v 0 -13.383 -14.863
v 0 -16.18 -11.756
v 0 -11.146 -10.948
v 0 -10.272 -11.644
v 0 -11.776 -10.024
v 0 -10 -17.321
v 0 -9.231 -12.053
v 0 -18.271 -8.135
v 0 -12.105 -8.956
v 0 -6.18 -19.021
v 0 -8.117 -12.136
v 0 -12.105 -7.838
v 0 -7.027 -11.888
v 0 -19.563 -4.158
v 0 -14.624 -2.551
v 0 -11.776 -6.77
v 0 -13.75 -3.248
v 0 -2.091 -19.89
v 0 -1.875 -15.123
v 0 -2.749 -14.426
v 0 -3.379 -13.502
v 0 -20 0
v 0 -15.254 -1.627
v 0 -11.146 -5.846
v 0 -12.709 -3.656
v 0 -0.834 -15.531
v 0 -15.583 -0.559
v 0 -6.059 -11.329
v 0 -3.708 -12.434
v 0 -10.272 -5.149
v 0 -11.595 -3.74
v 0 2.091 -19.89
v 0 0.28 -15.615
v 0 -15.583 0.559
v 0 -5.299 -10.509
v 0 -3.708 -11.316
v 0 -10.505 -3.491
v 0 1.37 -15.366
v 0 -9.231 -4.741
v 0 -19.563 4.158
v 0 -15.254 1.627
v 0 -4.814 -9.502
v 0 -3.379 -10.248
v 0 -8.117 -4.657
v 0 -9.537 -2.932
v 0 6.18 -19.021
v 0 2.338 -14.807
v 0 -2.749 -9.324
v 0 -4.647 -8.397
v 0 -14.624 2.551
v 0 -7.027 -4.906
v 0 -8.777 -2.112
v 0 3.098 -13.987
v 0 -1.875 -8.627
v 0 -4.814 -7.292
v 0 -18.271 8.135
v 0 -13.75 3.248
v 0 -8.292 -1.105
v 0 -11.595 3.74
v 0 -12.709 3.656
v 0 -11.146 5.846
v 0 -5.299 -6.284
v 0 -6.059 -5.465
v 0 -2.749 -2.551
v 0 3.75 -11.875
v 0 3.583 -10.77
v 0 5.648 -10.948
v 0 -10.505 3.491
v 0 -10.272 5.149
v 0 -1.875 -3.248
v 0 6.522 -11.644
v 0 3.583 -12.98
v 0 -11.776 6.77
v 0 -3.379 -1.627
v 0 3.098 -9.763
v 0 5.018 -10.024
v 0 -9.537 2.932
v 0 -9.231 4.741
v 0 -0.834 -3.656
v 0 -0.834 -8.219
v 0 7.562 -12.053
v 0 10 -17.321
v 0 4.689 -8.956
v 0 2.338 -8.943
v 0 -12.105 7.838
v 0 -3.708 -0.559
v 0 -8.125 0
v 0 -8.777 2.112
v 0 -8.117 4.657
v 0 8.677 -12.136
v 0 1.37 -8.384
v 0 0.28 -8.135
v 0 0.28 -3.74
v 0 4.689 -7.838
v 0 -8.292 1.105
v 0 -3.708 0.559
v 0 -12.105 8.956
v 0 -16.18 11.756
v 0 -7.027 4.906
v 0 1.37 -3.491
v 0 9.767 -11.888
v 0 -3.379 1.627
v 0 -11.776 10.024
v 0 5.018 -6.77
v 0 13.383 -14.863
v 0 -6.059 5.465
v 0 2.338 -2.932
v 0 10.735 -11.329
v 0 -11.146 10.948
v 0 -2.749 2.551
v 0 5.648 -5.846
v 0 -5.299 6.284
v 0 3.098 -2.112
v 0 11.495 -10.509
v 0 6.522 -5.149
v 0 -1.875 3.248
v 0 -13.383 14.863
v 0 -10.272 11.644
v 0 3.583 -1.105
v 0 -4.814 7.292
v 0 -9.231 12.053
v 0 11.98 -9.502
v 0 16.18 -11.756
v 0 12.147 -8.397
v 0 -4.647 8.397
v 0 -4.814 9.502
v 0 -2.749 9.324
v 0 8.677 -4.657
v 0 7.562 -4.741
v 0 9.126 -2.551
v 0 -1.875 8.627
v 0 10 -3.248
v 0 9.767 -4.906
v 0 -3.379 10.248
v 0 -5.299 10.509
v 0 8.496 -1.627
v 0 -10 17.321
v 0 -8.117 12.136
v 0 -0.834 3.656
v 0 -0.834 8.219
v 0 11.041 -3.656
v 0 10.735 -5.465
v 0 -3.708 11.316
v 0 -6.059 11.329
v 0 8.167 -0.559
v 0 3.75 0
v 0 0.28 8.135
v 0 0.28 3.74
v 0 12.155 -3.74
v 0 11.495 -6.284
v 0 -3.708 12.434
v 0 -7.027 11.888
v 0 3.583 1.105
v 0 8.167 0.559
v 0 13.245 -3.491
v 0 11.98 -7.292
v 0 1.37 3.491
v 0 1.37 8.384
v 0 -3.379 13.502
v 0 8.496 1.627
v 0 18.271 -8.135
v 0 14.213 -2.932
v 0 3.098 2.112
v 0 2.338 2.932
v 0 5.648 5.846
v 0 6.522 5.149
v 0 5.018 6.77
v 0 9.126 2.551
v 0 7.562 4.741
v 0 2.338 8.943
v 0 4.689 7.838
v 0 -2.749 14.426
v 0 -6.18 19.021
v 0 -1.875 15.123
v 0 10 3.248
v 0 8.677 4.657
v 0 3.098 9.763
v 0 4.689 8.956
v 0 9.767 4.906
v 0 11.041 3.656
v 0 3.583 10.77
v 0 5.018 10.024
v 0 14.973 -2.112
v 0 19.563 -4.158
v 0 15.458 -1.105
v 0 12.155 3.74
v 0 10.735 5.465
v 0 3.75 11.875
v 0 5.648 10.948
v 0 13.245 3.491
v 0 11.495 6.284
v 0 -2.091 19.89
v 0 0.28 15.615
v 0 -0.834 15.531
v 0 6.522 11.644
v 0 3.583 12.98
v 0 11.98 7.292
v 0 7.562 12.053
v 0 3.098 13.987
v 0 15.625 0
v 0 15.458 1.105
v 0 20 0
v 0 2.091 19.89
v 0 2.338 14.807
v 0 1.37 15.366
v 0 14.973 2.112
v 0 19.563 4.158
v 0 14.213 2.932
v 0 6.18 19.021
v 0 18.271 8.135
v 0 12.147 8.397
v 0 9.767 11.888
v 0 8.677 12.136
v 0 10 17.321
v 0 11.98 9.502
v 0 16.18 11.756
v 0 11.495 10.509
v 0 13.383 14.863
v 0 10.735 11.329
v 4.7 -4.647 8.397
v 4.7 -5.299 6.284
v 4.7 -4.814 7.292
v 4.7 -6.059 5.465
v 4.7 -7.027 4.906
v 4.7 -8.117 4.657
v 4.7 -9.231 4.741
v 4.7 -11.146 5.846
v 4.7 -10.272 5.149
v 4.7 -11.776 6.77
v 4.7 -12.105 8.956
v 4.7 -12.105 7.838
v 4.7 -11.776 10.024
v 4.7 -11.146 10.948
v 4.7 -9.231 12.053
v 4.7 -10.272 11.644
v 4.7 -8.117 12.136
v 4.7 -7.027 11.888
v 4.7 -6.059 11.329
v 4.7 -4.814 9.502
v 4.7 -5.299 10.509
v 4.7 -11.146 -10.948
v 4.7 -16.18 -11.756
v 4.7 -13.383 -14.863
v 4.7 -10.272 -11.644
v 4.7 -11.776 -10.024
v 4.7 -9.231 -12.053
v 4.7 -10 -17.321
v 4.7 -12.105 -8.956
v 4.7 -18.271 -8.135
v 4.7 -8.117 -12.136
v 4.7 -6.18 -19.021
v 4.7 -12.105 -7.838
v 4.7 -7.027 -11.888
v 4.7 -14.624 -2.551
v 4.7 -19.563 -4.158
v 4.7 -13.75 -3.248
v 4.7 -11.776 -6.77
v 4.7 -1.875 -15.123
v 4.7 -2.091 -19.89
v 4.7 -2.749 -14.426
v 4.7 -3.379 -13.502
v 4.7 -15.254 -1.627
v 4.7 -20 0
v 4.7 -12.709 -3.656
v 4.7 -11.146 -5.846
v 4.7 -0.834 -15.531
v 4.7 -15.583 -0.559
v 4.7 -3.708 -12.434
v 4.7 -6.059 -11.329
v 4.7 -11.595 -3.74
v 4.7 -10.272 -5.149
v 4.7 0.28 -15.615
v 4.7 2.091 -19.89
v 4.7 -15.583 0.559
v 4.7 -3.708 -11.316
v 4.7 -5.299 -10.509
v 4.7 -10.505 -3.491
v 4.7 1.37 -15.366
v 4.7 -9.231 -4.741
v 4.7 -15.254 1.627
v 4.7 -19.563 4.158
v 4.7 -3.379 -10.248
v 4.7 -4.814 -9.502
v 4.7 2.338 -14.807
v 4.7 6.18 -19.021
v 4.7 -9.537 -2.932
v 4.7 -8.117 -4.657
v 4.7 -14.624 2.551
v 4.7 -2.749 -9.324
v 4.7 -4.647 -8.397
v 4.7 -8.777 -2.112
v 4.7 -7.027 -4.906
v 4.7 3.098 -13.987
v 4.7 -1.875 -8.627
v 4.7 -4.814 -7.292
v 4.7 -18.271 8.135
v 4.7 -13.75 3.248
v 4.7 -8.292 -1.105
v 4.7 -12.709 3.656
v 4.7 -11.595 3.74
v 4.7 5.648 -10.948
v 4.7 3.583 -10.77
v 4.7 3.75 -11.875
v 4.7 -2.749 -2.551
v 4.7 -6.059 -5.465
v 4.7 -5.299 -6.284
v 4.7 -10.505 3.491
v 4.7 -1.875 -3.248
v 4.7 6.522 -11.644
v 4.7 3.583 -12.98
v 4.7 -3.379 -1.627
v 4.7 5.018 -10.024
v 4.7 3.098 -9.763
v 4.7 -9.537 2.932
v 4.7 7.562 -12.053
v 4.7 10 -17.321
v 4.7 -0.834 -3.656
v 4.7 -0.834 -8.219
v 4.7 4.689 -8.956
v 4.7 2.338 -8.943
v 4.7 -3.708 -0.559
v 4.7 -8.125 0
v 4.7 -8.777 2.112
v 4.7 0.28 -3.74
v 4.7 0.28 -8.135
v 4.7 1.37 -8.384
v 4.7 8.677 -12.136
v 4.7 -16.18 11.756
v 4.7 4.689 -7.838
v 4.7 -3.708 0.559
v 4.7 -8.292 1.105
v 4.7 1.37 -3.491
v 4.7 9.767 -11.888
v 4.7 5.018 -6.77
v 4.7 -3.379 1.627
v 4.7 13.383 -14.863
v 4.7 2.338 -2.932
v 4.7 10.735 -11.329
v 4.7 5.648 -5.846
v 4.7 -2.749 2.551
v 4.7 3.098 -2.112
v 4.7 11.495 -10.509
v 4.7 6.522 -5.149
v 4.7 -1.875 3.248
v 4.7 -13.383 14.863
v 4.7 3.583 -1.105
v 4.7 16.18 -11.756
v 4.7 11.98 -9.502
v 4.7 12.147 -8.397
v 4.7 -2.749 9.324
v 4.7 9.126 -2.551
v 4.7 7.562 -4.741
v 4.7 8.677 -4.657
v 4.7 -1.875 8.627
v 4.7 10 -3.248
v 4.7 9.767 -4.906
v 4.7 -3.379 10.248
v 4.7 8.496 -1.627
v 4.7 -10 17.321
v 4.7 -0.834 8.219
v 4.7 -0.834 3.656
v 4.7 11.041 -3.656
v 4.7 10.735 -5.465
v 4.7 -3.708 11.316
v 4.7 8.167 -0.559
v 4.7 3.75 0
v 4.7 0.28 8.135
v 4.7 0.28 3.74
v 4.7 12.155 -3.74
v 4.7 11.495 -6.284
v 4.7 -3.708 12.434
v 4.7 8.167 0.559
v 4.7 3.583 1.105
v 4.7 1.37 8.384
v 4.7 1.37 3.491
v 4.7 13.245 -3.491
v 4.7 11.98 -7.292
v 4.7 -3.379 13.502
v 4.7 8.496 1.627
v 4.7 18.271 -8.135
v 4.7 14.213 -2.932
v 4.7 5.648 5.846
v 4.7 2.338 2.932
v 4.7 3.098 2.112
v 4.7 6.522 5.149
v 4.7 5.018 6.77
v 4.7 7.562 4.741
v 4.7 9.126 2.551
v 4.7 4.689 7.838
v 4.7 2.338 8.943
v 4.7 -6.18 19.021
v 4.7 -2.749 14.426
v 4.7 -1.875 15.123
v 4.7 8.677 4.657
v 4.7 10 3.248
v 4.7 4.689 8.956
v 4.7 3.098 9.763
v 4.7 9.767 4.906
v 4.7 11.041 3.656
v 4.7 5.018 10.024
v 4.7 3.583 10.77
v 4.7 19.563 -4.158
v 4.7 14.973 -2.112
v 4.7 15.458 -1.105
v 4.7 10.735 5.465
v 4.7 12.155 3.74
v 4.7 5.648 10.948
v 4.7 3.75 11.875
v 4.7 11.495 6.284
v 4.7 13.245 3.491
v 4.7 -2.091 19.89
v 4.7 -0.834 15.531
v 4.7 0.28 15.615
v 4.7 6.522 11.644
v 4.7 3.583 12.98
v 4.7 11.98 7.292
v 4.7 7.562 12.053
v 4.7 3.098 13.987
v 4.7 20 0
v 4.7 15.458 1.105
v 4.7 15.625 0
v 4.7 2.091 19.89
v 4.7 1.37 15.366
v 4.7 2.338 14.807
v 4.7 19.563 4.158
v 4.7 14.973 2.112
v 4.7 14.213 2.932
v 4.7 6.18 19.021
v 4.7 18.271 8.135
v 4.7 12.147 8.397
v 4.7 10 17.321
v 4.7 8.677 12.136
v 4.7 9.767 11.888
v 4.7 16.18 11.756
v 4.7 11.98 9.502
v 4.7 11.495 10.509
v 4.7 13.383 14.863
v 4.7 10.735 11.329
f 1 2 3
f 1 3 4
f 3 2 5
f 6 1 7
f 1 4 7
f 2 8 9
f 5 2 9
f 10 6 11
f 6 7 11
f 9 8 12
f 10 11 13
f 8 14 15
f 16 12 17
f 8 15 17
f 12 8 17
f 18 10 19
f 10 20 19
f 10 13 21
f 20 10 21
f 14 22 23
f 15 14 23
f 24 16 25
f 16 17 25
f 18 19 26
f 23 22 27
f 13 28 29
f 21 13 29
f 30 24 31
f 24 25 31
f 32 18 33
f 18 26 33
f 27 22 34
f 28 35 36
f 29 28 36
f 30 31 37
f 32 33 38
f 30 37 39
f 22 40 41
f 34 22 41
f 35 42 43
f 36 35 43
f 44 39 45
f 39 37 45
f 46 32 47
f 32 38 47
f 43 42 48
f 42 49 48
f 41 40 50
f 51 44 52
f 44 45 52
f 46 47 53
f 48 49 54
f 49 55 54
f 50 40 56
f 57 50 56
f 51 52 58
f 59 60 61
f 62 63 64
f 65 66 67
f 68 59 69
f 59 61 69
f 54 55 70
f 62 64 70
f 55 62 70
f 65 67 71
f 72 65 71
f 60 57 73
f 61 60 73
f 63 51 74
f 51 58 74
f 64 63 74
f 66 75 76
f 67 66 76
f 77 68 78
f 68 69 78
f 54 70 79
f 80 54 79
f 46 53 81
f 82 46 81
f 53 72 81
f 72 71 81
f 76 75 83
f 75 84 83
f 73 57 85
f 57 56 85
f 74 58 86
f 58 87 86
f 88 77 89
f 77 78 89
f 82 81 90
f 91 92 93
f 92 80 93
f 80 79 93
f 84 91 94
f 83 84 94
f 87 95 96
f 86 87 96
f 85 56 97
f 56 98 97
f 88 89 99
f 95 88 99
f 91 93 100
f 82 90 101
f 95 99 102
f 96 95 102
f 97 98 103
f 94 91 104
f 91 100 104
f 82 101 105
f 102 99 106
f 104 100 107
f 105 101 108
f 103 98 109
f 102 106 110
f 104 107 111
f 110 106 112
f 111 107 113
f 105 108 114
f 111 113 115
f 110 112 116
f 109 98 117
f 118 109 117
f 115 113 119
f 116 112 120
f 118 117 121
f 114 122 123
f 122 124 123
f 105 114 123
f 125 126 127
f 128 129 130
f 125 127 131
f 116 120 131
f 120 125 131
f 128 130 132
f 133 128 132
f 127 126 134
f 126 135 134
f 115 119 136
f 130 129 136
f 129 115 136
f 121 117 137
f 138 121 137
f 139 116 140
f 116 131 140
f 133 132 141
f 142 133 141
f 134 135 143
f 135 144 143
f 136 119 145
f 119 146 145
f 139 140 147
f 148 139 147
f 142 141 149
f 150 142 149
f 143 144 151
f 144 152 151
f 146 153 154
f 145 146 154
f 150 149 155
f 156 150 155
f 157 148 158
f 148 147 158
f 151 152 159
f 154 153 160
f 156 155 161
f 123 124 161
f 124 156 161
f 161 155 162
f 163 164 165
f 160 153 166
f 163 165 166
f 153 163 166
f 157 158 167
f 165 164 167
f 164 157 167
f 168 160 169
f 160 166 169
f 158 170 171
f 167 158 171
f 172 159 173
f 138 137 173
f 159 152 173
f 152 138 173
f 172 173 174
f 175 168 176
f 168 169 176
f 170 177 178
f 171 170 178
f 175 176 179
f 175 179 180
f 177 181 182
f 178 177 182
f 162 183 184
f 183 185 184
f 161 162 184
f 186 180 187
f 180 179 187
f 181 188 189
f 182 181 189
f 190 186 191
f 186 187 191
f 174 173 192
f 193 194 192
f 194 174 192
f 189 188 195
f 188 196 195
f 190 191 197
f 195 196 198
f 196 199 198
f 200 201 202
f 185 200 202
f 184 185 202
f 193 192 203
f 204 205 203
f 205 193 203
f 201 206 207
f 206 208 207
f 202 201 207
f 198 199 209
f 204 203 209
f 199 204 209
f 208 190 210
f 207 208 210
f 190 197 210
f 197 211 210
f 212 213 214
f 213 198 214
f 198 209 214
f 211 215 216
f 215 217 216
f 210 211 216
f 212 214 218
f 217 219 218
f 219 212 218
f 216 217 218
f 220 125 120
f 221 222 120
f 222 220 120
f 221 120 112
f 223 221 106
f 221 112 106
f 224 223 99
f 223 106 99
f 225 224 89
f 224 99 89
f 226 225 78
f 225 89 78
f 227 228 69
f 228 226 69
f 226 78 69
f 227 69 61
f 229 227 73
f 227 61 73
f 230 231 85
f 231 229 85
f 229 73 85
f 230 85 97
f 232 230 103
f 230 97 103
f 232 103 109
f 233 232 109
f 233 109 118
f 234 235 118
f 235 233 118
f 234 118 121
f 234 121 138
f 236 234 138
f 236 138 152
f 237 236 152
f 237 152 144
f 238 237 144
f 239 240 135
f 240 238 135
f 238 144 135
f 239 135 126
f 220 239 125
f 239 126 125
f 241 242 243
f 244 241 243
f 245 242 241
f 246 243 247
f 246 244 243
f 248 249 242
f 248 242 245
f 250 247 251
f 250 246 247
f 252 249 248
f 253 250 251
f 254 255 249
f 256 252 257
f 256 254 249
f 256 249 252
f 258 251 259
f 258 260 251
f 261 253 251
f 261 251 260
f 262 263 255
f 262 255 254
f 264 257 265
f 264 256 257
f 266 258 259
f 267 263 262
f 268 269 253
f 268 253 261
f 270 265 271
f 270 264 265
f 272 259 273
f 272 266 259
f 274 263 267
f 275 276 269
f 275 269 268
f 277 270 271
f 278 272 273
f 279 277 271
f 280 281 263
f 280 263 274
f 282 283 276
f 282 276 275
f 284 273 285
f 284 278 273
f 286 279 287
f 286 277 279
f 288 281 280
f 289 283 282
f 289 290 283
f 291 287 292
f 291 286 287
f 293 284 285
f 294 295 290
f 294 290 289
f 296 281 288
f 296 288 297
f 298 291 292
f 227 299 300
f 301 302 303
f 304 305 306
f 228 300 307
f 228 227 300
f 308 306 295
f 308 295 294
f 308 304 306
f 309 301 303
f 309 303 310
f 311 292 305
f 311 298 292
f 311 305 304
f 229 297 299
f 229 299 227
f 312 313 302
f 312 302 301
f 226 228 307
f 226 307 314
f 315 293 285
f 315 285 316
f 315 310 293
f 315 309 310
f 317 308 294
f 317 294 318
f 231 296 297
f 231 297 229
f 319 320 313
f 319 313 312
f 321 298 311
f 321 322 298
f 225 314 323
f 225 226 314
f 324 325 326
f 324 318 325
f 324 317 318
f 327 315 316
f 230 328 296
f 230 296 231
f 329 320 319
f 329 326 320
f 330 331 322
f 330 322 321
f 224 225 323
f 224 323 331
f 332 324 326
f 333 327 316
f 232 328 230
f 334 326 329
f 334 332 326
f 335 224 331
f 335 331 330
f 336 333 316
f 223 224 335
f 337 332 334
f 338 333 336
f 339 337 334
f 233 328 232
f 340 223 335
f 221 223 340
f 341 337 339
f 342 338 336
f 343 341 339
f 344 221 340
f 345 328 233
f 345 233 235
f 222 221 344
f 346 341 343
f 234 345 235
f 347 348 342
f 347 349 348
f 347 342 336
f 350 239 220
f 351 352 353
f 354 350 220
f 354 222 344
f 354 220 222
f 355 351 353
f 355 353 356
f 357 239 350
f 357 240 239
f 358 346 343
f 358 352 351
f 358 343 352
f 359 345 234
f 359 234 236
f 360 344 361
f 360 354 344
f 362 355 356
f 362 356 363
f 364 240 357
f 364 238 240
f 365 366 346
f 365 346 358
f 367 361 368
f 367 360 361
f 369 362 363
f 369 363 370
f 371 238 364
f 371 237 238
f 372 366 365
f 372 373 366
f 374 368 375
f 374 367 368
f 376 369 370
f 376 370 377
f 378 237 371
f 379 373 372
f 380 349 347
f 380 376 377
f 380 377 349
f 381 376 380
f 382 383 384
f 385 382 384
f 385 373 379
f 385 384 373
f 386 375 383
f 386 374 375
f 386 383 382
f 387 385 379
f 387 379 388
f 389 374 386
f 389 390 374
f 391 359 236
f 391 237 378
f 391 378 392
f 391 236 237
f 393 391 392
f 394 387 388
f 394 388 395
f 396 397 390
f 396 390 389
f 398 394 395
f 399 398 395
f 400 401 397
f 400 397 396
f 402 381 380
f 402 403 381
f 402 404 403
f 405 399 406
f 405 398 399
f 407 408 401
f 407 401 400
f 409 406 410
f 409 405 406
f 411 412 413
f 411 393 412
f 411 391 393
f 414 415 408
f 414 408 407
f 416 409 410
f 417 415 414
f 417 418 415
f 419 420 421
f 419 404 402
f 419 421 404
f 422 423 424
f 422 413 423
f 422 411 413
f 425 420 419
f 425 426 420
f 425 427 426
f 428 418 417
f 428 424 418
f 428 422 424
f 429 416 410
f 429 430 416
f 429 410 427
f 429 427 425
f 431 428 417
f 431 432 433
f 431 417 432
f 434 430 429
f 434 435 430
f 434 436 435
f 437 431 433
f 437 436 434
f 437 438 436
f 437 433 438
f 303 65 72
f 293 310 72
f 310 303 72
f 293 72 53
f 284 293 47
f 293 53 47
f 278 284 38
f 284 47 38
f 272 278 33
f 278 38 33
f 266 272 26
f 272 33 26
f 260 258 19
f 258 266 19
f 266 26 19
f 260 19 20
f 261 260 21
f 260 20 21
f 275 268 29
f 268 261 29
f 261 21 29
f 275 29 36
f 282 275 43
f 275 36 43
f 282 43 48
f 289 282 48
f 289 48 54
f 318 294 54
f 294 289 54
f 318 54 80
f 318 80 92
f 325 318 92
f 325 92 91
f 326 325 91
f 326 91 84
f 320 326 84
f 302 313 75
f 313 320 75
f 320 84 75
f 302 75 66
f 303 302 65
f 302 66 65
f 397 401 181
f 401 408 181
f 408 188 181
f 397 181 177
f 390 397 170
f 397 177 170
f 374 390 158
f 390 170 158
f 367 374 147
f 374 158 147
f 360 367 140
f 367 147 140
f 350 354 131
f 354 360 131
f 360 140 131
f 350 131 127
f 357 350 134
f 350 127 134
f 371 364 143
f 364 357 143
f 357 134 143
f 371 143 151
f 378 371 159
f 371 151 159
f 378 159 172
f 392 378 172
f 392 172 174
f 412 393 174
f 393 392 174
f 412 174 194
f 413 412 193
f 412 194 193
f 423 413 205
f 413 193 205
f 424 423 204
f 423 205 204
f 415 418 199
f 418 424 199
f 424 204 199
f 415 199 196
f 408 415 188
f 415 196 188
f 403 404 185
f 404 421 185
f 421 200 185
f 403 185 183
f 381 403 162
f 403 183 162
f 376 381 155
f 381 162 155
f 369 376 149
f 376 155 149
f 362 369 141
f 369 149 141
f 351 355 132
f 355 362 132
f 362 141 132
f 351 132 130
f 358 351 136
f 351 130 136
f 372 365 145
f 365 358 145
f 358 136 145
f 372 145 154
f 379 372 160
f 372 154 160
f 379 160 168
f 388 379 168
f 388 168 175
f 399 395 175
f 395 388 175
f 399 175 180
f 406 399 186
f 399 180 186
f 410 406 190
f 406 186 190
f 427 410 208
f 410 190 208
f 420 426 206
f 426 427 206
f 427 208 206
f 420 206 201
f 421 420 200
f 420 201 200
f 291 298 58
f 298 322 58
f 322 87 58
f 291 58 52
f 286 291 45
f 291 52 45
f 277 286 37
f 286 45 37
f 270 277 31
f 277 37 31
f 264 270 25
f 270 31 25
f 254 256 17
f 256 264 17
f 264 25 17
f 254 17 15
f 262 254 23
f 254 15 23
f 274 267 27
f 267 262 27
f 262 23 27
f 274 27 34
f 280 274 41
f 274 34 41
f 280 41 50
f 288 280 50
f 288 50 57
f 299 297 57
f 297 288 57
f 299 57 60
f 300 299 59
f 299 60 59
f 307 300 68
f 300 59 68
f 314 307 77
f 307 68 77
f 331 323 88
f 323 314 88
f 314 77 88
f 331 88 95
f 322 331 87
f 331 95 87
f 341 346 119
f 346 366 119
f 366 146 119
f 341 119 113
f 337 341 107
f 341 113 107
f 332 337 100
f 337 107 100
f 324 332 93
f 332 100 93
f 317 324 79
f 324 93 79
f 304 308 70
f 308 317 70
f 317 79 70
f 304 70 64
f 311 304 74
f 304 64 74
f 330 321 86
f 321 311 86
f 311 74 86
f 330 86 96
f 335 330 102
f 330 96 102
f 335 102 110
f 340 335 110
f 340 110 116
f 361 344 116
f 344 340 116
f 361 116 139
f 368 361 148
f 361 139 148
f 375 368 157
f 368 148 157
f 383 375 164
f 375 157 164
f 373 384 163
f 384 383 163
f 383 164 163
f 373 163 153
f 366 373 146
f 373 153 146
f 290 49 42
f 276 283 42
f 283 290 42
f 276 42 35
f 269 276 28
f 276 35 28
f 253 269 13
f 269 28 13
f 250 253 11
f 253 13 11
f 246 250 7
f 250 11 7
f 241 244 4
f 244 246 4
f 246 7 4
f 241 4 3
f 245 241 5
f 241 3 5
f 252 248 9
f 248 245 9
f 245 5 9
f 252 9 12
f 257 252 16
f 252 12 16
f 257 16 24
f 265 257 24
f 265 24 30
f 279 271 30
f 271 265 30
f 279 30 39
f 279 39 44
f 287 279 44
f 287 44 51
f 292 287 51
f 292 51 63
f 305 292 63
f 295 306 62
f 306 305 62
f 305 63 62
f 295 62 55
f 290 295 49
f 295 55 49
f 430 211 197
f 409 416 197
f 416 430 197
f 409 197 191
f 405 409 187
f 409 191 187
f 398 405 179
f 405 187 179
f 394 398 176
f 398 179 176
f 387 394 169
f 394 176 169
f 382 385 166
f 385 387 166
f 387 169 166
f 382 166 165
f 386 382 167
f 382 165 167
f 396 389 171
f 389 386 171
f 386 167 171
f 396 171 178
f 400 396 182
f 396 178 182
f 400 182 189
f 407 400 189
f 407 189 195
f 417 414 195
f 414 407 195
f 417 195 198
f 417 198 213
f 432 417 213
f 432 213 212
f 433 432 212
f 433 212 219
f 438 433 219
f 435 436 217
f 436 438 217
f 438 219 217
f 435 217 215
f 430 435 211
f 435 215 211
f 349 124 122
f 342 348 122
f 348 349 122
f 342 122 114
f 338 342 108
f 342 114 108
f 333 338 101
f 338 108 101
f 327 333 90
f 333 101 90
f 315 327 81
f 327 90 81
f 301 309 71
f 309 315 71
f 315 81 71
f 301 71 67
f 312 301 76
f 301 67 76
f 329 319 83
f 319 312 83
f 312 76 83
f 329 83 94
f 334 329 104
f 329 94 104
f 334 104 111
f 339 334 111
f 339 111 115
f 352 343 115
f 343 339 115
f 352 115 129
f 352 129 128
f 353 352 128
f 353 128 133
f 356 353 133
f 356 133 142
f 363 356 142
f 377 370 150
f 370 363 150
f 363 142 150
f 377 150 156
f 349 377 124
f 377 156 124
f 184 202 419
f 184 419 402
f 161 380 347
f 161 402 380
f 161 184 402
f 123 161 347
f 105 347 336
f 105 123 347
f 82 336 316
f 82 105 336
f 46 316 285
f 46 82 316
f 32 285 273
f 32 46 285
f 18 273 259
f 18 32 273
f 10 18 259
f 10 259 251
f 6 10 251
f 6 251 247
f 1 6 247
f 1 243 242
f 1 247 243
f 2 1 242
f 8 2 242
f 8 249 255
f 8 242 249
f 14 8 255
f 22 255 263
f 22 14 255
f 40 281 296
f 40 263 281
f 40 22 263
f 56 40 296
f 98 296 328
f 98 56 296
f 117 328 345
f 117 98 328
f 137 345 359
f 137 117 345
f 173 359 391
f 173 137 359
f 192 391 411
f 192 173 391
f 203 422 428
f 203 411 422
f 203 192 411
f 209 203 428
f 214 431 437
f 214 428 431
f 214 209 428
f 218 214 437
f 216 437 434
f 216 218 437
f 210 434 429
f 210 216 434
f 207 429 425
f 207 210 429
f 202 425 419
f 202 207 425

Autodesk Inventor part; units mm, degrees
ref_plane "YZ Plane" through (0, 0, 0) normal (1, 0, 0) x (0, 1, 0)
ref_plane "XZ Plane" through (0, 0, 0) normal (0, 1, 0) x (-1, 0, 0)
ref_plane "XY Plane" through (0, 0, 0) normal (0, 0, 1) x (1, 0, 0)
sketch "Sketch2" plane through (0, 0, 0) normal (1, 0, 0) x (0, 1, 0)
  circle A0 centre (0, 0) radius 20
  circle A1 centre (0, 0) radius 3.75
  circle A2 centre (11.875, 0) radius 3.75
  line L0 (20, 0) -> (15.625, 0) construction
  line L1 (8.125, 0) -> (3.75, 0) construction
  line L2 (0, 0) -> (3.75, 0) construction
  circle A3 centre (0, 11.875) radius 3.75
  circle A4 centre (-11.875, 0) radius 3.75
  circle A5 centre (0, -11.875) radius 3.75
  circle A6 centre (8.3969, 8.3969) radius 3.75
  circle A7 centre (0, 11.875) radius 3.75
  circle A8 centre (-8.3969, 8.3969) radius 3.75
  circle A9 centre (-11.875, 0) radius 3.75
  circle A10 centre (-8.3969, -8.3969) radius 3.75
  circle A11 centre (0, -11.875) radius 3.75
  circle A12 centre (8.3969, -8.3969) radius 3.75
  point P0 (0, 15.625)
  point P1 (0, 8.125)
  point P2 (-15.625, 0)
  point P3 (-8.125, 0)
  point P4 (0, -15.625)
  point P5 (0, -8.125)
  point P6 (11.0485, 11.0485)
  point P7 (5.7452, 5.7452)
  point P8 (0, 15.625)
  point P9 (0, 8.125)
  point P10 (-11.0485, 11.0485)
  point P11 (-5.7452, 5.7452)
  point P12 (-15.625, 0)
  point P13 (-8.125, 0)
  point P14 (-11.0485, -11.0485)
  point P15 (-5.7452, -5.7452)
  point P16 (0, -15.625)
  point P17 (0, -8.125)
  point P18 (11.0485, -11.0485)
  point P19 (5.7452, -5.7452)
  dimension "d0" = 40
  dimension "d1" = 7.5
  dimension "d6" = 360
  dimension "d10" = 360
  dimension "d12" = 7.5
extrude "Extrusion1" add sketch "Sketch2" along normal blind 4.7
properties part number "small_wheel_3DPrint"
